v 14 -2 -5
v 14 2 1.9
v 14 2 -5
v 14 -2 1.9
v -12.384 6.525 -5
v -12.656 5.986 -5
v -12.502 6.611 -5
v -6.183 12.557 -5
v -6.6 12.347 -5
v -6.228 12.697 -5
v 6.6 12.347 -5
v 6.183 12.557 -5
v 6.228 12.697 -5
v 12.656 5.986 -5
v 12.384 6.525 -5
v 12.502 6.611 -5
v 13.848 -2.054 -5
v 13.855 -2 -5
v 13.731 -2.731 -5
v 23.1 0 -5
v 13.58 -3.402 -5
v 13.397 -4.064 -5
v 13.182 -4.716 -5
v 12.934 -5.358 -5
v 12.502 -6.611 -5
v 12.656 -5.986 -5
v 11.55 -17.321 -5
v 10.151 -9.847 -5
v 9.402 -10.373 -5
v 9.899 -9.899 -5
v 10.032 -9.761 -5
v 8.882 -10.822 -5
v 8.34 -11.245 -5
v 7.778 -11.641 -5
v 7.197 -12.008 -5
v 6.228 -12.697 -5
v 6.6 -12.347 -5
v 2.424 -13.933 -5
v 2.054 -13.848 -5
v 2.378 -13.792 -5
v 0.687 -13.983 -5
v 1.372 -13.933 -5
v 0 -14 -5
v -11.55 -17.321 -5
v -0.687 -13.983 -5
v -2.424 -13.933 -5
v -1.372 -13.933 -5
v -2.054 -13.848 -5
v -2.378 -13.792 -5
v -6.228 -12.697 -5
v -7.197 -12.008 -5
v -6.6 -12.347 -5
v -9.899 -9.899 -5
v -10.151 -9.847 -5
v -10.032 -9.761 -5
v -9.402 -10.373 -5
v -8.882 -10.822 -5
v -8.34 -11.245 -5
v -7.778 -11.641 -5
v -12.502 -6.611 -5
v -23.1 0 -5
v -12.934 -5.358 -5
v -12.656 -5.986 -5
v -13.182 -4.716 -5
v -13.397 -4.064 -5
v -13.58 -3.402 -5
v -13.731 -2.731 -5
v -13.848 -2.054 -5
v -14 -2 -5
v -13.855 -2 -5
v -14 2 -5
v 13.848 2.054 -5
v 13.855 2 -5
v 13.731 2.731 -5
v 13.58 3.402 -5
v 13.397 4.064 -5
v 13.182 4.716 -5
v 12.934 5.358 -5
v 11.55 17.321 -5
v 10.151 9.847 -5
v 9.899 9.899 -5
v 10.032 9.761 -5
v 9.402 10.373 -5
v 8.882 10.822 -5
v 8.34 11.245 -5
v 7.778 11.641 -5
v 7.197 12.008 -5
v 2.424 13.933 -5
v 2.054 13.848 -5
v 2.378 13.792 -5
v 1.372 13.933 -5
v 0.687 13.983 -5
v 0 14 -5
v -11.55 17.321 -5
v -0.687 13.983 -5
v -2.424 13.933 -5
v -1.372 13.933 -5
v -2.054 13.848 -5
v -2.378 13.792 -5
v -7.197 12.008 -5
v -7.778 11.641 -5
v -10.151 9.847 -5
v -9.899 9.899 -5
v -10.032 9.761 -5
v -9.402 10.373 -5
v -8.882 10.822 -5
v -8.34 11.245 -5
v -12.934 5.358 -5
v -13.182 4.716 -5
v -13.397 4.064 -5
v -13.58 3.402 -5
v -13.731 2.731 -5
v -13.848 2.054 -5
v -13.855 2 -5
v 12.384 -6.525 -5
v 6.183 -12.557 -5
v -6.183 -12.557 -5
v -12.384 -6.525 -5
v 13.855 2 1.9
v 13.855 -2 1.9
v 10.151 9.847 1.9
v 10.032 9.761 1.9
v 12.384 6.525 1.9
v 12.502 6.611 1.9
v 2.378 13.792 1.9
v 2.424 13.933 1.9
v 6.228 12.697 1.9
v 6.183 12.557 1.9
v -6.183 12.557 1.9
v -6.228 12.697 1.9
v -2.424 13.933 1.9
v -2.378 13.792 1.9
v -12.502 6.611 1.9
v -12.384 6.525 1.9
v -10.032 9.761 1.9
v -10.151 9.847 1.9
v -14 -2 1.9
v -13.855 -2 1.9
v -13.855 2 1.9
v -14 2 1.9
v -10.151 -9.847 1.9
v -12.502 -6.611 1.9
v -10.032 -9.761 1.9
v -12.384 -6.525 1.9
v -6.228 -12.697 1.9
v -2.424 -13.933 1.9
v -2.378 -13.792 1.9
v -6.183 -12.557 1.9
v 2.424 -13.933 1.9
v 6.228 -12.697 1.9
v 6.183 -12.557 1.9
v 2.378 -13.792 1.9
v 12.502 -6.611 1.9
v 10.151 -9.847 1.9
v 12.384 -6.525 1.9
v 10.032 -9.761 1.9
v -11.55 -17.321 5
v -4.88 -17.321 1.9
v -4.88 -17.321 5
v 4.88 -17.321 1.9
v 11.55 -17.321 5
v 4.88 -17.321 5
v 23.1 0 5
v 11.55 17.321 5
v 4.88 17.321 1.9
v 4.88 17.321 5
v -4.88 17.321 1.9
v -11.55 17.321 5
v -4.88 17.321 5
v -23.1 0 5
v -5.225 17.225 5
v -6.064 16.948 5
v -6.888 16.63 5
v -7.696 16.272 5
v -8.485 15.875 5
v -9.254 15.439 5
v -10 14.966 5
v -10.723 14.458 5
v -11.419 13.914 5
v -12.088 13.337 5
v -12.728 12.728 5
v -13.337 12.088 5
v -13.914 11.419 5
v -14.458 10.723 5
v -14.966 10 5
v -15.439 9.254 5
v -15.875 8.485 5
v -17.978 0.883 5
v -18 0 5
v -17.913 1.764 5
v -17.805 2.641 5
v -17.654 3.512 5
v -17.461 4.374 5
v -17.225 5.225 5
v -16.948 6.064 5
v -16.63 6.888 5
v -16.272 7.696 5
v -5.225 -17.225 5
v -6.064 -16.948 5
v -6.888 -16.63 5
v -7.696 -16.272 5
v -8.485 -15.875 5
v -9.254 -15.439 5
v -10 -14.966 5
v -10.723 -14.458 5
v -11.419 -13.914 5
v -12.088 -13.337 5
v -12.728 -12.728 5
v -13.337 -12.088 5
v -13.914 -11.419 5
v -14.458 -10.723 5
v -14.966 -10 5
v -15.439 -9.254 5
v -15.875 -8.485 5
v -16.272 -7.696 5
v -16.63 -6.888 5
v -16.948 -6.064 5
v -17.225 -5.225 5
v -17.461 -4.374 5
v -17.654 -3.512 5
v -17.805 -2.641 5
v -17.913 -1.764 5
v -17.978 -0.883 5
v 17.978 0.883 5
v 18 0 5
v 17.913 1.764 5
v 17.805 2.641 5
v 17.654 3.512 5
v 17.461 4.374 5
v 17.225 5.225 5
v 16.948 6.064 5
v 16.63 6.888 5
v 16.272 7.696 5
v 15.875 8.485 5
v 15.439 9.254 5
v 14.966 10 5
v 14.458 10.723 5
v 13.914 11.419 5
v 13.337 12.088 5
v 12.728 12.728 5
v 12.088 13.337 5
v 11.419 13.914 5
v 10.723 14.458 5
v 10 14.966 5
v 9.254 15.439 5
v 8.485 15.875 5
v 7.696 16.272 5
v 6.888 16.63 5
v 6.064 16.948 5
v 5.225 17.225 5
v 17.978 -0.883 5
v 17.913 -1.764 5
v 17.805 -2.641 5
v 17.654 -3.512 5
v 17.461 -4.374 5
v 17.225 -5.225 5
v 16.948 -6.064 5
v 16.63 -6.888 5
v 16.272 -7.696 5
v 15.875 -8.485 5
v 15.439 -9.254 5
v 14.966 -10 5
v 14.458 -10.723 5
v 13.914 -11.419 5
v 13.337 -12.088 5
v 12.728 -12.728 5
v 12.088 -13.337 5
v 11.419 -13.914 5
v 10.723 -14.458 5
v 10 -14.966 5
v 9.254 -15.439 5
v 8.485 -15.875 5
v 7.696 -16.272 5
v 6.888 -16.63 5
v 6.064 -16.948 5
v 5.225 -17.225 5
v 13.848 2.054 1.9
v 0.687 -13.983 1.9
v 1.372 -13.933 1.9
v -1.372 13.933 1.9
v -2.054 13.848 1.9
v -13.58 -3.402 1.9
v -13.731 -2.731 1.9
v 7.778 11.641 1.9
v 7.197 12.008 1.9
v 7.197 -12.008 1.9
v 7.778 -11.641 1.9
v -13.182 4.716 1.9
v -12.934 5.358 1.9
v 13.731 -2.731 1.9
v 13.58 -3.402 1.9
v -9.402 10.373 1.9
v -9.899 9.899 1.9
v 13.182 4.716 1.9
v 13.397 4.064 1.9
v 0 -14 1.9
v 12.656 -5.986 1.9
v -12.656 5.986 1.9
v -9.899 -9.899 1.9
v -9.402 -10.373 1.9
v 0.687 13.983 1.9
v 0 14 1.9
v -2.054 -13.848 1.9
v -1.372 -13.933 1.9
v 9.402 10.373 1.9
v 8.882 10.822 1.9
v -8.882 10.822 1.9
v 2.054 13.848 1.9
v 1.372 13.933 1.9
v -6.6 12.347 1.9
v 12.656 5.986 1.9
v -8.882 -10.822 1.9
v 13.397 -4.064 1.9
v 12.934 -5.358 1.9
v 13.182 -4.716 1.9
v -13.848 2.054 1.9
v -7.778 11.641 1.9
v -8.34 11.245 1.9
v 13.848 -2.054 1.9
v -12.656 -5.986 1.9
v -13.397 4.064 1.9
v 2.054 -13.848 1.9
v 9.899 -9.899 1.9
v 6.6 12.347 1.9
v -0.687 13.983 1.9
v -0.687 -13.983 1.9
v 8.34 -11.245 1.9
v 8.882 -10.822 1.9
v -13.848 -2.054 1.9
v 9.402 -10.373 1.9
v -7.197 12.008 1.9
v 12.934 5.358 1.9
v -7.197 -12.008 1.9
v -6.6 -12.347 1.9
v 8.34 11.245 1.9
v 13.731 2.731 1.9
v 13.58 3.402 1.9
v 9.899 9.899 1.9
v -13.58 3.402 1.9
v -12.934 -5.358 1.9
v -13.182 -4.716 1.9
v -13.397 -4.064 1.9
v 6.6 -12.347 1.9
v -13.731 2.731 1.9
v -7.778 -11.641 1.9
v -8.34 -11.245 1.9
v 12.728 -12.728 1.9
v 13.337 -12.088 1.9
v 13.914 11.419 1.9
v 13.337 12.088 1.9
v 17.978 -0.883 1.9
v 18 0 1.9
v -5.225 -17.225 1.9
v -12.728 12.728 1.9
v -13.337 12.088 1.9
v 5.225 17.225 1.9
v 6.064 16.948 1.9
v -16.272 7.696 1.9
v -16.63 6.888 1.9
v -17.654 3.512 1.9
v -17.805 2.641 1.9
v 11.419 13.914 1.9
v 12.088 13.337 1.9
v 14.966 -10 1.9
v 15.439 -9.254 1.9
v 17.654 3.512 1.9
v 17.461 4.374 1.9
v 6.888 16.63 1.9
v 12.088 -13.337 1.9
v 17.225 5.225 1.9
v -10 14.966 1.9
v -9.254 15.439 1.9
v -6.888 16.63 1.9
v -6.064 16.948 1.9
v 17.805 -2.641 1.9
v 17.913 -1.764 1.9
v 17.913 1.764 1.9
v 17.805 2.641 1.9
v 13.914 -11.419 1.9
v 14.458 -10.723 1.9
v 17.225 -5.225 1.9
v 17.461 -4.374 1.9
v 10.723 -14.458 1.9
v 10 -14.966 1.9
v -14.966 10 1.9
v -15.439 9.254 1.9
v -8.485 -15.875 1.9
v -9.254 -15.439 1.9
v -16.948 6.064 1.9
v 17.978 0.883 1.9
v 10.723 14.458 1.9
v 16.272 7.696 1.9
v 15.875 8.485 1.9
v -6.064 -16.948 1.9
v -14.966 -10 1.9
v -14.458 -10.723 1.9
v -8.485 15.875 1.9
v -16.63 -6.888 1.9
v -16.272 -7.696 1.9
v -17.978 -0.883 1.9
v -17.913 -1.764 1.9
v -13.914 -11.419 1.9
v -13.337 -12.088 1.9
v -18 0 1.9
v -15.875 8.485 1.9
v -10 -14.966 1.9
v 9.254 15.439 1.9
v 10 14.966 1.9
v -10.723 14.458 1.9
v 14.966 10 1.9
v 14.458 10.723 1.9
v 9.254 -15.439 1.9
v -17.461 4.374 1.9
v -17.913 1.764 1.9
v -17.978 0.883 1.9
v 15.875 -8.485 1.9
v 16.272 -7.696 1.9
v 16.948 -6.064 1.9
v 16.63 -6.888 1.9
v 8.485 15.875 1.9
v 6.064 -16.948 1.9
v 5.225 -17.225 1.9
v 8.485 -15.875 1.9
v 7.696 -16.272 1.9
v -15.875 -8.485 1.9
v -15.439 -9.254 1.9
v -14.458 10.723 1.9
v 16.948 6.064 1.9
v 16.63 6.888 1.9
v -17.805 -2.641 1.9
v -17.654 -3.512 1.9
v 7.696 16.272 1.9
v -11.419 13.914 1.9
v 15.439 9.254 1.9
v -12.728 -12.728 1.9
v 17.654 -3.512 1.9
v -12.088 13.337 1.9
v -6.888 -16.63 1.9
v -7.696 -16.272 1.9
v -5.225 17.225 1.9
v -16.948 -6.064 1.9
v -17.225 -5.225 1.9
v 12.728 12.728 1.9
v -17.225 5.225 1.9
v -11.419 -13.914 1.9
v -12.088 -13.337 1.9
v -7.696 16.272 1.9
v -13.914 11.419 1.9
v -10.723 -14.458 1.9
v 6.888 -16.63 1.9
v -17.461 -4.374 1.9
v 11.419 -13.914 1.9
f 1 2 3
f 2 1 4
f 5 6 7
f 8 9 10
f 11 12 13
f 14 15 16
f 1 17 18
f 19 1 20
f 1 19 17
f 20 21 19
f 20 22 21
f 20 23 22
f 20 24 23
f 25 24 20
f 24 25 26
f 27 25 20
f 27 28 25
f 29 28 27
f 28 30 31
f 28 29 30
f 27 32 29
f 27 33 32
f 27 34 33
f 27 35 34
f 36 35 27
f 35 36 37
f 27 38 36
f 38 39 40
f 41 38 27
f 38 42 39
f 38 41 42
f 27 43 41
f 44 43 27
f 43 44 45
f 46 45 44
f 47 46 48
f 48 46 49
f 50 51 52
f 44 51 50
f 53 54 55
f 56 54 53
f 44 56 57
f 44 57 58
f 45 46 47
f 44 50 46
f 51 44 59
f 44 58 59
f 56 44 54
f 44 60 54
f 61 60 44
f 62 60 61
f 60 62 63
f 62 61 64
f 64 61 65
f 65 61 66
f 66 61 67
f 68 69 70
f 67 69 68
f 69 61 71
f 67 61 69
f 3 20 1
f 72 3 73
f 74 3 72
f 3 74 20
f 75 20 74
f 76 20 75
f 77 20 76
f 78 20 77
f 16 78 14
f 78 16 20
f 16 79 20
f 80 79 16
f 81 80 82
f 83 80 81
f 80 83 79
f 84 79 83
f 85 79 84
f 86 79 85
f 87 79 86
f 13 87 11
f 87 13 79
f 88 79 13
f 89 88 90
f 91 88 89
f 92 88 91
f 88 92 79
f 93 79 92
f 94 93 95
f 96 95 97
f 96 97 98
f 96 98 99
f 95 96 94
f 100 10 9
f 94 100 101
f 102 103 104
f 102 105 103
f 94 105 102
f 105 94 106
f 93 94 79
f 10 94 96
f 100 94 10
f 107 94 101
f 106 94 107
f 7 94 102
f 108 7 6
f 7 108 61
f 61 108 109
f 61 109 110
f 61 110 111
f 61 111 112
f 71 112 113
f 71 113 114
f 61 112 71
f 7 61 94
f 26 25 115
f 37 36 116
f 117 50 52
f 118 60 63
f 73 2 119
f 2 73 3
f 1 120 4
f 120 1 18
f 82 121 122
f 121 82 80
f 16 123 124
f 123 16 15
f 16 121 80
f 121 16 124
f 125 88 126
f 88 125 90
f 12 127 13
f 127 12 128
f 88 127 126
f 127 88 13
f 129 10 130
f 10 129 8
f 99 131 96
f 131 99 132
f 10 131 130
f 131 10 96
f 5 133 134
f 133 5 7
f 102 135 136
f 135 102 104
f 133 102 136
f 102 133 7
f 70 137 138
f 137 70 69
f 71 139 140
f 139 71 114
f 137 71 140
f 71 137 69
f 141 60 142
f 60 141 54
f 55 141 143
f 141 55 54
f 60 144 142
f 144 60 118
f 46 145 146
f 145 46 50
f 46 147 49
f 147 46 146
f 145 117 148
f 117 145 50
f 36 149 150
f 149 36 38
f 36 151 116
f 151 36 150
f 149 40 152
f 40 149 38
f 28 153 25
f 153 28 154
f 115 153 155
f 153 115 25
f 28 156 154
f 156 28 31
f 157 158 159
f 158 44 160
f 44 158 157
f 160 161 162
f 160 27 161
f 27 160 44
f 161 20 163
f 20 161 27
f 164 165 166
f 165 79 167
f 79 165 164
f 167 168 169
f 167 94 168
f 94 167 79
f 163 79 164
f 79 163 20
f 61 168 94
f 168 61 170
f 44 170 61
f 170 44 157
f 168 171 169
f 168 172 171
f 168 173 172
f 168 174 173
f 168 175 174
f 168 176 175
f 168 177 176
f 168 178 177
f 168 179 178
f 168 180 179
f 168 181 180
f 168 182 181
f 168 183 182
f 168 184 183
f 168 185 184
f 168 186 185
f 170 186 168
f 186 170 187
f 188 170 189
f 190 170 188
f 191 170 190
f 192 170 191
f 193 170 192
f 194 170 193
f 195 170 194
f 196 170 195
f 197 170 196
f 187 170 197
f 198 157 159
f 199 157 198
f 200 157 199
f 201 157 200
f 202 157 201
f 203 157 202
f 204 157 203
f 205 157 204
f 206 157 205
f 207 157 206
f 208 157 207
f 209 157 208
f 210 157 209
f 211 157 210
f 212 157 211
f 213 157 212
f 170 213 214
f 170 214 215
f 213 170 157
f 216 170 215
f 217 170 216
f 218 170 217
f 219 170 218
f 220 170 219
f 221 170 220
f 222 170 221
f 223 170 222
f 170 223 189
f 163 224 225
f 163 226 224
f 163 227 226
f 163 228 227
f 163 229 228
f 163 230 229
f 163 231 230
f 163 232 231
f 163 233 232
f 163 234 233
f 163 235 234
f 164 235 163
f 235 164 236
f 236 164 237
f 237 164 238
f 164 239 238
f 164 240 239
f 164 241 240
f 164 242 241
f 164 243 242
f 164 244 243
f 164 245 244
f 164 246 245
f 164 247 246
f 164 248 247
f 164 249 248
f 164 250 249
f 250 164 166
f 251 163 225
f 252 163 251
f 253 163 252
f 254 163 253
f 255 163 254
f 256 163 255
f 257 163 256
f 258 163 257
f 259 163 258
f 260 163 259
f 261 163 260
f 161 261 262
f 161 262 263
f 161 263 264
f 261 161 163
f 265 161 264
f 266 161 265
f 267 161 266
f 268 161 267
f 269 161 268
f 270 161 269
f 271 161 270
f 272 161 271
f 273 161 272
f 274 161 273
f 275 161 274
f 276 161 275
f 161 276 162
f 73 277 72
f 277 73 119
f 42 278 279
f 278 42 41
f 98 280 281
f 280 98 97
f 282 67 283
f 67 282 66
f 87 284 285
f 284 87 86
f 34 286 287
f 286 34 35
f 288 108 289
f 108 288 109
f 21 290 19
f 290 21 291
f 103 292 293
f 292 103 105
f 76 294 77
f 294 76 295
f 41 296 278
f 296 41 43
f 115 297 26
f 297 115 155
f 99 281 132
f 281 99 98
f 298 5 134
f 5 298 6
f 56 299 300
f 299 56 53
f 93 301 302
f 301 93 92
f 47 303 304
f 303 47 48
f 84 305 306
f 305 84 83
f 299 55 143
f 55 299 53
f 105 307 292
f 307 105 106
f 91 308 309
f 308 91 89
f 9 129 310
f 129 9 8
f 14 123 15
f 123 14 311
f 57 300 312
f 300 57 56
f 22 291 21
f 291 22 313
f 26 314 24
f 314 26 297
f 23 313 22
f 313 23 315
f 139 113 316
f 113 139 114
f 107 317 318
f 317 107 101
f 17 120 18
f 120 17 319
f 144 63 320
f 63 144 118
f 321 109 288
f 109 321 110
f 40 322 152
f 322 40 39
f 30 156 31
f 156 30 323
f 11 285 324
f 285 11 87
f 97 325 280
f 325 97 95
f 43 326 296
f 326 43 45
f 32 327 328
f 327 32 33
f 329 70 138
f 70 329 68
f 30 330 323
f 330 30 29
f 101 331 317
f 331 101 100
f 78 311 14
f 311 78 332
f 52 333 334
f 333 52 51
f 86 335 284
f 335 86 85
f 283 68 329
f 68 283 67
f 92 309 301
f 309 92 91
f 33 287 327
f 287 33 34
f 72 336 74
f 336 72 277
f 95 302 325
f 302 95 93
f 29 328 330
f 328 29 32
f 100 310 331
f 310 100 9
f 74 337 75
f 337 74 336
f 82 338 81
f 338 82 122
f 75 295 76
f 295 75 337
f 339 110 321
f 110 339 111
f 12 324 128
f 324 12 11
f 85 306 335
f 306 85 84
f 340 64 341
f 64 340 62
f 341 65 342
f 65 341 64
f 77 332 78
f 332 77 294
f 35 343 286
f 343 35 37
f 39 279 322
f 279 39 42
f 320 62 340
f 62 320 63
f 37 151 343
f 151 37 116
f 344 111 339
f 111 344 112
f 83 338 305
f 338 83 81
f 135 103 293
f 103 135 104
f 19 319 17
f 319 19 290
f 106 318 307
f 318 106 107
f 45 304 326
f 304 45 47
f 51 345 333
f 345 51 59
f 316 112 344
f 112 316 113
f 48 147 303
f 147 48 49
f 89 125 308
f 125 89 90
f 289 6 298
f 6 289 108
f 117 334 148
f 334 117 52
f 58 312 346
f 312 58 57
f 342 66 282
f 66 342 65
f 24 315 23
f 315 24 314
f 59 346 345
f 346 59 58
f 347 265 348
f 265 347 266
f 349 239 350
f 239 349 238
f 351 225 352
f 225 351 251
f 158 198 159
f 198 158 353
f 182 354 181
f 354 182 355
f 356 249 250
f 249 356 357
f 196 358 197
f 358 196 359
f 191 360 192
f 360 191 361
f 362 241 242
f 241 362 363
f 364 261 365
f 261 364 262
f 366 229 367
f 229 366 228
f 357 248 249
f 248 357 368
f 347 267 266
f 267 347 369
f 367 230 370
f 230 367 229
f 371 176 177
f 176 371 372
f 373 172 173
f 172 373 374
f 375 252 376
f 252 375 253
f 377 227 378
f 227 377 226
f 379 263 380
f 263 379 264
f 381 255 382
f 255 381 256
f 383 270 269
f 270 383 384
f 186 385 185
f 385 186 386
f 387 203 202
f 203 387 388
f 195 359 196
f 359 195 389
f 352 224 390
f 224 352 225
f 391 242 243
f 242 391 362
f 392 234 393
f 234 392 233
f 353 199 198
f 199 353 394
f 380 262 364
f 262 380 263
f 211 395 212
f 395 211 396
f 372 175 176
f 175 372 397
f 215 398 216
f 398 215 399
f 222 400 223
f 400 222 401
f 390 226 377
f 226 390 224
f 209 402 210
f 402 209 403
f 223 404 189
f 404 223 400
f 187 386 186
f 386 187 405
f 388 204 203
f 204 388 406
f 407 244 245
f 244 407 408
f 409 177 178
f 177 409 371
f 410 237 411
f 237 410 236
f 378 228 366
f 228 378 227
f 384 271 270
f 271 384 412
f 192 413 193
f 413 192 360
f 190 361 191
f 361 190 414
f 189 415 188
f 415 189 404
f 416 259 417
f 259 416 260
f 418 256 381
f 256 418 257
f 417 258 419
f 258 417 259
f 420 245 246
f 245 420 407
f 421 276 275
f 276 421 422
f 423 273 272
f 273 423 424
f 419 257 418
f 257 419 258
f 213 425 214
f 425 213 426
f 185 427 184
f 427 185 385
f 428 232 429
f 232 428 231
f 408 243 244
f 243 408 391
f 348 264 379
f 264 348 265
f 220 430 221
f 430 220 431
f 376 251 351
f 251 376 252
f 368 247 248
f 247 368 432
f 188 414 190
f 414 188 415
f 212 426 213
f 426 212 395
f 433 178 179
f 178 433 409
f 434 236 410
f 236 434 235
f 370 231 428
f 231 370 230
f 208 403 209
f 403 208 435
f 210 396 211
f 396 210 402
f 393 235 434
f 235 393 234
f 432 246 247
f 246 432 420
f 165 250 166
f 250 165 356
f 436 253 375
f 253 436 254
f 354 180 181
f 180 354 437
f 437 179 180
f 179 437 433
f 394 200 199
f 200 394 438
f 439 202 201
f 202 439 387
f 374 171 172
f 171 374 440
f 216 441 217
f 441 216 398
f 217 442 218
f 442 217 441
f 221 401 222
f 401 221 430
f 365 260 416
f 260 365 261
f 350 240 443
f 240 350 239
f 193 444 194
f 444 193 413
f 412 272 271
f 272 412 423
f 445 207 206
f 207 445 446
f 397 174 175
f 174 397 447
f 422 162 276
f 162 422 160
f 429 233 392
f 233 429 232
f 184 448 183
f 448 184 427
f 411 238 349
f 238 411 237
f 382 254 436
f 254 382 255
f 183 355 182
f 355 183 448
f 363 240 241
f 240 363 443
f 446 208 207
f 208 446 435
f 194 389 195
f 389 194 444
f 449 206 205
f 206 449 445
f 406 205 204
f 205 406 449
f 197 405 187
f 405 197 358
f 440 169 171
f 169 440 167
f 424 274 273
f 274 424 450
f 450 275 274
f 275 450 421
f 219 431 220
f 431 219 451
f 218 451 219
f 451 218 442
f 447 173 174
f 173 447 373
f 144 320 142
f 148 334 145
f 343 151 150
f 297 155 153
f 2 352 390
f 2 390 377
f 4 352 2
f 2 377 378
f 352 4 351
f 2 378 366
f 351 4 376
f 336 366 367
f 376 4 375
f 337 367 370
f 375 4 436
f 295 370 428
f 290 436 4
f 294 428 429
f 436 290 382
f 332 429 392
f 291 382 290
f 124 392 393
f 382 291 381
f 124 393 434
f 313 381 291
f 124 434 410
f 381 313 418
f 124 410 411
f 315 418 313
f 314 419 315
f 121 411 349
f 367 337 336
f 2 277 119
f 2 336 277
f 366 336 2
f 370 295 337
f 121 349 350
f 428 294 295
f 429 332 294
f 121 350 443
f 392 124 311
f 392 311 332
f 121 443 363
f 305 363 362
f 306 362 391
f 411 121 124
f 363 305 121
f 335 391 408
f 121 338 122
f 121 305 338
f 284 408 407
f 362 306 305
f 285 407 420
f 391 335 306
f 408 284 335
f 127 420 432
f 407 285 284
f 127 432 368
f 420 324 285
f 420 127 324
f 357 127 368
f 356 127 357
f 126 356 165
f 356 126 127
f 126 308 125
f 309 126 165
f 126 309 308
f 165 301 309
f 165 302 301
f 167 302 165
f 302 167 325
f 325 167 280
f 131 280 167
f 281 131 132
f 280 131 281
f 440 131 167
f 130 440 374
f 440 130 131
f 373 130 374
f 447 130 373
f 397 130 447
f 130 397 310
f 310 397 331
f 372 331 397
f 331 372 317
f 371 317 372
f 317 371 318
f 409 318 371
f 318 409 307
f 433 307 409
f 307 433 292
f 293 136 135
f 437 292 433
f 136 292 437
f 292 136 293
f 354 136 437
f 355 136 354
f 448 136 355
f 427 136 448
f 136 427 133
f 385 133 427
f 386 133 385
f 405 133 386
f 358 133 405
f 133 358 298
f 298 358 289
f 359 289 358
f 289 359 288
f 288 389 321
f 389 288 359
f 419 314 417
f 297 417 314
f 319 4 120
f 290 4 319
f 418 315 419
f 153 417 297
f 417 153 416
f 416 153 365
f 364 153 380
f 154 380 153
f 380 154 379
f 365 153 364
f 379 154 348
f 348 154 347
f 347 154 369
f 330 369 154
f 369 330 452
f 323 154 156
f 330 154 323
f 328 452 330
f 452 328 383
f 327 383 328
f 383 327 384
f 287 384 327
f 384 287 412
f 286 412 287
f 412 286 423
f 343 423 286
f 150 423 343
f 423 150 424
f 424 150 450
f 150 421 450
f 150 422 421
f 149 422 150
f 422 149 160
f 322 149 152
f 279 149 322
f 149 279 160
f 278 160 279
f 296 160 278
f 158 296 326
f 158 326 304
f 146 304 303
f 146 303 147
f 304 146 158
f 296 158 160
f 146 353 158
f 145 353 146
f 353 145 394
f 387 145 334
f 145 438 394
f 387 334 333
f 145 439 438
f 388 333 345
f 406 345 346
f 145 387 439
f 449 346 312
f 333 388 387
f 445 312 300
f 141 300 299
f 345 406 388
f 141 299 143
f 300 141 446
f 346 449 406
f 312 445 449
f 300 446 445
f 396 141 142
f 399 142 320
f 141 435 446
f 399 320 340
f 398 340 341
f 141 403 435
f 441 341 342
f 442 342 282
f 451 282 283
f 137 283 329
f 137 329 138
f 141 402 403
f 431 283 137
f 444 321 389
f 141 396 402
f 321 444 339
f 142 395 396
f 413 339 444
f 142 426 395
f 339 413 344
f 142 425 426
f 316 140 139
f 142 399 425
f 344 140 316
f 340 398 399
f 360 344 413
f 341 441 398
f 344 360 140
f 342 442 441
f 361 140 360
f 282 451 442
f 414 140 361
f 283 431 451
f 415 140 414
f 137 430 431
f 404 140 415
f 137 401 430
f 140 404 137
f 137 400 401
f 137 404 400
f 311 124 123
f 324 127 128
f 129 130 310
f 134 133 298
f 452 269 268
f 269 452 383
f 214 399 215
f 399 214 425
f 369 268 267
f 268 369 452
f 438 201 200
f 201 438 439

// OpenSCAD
$fn=96;

outer_x = 46.2;
outer_y = 40.0;
thickness = 10.0;

outer_r = outer_x/2;
inner_through_d = 28.0;
inner_through_r = inner_through_d/2;

recess_depth = 3.0;
recess_r = 18.0;

lug_count = 10;
lug_radial_len = 2.2;
lug_tangential_w = 4.0;
lug_height = thickness - recess_depth;

module outer_hex_elliptical(h, rx, ry){
    scale([rx, ry, 1])
        cylinder(h=h, r=1, center=true, $fn=6);
}

module lug(i, base_r, radial_len, tang_w, h){
    rotate([0,0, i*360/lug_count])
        translate([base_r - radial_len/2, 0, 0])
            cube([radial_len, tang_w, h], center=true);
}

module lugs(){
    for(i=[0:lug_count-1])
        lug(i, inner_through_r, lug_radial_len, lug_tangential_w, lug_height);
}

module collar(){
    difference(){
        outer_hex_elliptical(thickness, outer_r, outer_y/2);

        cylinder(h=thickness+0.4, r=inner_through_r, center=true, $fn=128);

        translate([0,0, thickness/2 - recess_depth/2])
            cylinder(h=recess_depth+0.2, r=recess_r, center=true, $fn=128);

        translate([0,0, thickness/2 - recess_depth - lug_height/2])
            lugs();
    }
}

collar();
